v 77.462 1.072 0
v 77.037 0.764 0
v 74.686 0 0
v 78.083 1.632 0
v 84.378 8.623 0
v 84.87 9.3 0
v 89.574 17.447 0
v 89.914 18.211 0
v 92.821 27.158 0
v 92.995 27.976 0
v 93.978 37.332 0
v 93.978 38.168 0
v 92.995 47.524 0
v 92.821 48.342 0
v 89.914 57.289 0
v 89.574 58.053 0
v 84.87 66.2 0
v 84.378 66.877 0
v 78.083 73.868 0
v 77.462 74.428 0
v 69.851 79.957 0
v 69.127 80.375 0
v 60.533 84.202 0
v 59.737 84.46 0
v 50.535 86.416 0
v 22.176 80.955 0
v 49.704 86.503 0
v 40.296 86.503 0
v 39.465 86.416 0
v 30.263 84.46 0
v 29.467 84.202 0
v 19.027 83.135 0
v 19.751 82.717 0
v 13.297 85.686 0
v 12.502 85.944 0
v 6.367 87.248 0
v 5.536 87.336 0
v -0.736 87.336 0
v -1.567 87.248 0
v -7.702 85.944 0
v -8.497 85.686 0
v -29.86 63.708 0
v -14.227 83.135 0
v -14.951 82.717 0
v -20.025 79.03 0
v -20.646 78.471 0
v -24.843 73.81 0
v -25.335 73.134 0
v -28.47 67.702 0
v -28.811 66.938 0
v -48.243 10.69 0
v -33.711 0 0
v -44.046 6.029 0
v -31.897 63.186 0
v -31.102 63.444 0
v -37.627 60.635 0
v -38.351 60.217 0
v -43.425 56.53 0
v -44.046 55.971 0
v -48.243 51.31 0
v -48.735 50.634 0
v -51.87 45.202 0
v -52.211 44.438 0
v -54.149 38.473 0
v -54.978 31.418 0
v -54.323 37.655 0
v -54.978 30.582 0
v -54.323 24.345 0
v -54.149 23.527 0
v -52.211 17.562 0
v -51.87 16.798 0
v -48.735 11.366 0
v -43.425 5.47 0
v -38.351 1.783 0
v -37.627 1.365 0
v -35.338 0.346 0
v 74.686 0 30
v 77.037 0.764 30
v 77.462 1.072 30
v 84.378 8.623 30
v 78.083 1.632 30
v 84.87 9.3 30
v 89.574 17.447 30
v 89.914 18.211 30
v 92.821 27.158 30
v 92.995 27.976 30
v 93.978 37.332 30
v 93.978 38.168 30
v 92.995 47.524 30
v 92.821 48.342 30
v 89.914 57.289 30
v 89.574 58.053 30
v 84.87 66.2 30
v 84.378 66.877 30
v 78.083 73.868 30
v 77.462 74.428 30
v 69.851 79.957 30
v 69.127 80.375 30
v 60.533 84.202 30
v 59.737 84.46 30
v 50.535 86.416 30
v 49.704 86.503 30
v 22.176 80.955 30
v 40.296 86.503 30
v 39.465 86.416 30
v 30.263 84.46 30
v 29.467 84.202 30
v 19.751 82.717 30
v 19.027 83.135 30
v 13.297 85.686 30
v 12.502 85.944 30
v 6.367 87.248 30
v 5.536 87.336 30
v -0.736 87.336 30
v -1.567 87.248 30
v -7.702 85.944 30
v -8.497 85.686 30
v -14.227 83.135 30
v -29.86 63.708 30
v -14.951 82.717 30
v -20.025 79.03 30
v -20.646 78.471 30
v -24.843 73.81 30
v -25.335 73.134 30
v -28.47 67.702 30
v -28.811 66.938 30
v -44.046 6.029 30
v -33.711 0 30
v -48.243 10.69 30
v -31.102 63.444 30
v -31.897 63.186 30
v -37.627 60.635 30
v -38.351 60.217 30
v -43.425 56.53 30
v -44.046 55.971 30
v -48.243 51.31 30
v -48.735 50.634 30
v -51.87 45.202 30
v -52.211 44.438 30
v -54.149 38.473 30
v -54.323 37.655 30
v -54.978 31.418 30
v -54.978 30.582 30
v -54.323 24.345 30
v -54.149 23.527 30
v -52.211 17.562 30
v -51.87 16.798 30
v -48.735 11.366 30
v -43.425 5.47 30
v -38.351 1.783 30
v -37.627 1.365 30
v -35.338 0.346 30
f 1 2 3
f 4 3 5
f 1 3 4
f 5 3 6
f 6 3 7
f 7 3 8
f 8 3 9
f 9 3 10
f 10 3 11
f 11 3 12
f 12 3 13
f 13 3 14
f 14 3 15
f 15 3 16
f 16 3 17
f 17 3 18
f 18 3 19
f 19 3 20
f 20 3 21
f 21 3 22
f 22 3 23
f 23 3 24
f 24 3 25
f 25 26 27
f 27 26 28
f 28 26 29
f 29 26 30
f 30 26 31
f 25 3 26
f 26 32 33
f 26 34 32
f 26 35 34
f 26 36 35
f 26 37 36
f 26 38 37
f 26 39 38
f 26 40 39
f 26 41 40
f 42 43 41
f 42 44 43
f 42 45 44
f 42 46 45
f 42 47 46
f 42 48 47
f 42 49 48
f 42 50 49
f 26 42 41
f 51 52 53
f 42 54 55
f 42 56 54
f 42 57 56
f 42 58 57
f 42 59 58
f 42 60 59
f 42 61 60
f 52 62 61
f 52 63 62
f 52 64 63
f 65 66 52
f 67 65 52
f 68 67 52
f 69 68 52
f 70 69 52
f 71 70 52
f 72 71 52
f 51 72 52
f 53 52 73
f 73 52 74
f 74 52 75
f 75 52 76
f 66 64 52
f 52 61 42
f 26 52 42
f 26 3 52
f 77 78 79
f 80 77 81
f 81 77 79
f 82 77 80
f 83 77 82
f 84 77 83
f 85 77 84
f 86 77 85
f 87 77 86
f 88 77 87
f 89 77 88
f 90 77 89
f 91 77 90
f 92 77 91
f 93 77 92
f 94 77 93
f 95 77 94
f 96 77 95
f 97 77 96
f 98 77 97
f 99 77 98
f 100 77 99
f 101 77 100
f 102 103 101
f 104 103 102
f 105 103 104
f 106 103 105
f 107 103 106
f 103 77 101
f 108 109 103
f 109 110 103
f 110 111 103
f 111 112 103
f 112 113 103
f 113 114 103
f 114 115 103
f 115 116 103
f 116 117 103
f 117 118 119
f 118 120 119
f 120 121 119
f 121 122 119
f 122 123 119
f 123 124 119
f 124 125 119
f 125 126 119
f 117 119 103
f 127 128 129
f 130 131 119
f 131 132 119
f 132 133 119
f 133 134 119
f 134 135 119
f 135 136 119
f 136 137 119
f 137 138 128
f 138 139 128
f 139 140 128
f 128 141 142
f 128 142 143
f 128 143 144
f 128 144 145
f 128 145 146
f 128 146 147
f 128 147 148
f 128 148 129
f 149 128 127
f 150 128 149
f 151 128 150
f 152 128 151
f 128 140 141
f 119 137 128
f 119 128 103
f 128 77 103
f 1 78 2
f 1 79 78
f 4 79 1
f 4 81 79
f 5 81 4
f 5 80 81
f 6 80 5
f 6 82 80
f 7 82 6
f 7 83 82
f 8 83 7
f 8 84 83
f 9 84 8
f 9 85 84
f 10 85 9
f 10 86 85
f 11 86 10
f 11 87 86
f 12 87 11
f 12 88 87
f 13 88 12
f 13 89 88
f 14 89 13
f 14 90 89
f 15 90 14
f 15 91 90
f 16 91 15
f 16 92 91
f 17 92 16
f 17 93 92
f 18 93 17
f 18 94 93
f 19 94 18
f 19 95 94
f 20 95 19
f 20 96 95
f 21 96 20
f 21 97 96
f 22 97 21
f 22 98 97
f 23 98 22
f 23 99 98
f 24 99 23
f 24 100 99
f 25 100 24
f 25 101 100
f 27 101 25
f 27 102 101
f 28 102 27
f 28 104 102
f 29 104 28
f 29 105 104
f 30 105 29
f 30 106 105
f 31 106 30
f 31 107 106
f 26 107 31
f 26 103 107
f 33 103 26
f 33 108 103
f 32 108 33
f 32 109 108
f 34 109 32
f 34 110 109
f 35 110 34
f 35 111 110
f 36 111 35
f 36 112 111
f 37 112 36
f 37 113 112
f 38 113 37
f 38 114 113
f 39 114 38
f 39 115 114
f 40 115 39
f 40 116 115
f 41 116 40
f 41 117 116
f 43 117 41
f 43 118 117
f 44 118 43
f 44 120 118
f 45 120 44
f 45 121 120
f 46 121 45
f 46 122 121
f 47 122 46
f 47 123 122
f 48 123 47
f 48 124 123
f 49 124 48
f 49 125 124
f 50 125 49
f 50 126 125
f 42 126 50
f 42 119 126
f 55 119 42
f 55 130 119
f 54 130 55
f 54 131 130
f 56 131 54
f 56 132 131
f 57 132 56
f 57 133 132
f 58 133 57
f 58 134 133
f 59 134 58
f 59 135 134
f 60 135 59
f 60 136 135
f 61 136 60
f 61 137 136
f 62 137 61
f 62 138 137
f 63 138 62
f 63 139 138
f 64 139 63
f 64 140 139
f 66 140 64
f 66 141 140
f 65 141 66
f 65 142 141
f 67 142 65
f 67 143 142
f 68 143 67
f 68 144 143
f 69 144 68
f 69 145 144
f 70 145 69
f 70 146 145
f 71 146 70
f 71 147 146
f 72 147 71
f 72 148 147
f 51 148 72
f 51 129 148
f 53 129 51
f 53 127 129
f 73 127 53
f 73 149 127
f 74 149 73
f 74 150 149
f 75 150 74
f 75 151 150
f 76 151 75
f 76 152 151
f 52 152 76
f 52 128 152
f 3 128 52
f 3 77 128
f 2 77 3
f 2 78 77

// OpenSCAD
module cloud_xy(
    thickness=30
  , offset_r=4
  , r1=30
  , r2=45
  , r3=25
) {
  linear_extrude(height=thickness) {
    translate([0, offset_r])
    offset(r=offset_r) difference() {
      union() {
        translate([-r1 * 0.7, r1 * 0.9]) circle(r1);
        translate([r1 * 0.08, r1 * 1.65]) circle(r1);
        translate([r2, r2 * 0.75]) circle(r2);
        translate([r3 * 0.25, r3 * 0.75]) circle(r3);
      }
      translate([-(r1 * 2 + r2 + r3), -2 * (r1 + r2 + r3)]) 
        square([2 * (r1 * 2 + r2 + r3), 2 * (r1 + r2 + r3)]);
    }
  }
}

cloud_xy();
